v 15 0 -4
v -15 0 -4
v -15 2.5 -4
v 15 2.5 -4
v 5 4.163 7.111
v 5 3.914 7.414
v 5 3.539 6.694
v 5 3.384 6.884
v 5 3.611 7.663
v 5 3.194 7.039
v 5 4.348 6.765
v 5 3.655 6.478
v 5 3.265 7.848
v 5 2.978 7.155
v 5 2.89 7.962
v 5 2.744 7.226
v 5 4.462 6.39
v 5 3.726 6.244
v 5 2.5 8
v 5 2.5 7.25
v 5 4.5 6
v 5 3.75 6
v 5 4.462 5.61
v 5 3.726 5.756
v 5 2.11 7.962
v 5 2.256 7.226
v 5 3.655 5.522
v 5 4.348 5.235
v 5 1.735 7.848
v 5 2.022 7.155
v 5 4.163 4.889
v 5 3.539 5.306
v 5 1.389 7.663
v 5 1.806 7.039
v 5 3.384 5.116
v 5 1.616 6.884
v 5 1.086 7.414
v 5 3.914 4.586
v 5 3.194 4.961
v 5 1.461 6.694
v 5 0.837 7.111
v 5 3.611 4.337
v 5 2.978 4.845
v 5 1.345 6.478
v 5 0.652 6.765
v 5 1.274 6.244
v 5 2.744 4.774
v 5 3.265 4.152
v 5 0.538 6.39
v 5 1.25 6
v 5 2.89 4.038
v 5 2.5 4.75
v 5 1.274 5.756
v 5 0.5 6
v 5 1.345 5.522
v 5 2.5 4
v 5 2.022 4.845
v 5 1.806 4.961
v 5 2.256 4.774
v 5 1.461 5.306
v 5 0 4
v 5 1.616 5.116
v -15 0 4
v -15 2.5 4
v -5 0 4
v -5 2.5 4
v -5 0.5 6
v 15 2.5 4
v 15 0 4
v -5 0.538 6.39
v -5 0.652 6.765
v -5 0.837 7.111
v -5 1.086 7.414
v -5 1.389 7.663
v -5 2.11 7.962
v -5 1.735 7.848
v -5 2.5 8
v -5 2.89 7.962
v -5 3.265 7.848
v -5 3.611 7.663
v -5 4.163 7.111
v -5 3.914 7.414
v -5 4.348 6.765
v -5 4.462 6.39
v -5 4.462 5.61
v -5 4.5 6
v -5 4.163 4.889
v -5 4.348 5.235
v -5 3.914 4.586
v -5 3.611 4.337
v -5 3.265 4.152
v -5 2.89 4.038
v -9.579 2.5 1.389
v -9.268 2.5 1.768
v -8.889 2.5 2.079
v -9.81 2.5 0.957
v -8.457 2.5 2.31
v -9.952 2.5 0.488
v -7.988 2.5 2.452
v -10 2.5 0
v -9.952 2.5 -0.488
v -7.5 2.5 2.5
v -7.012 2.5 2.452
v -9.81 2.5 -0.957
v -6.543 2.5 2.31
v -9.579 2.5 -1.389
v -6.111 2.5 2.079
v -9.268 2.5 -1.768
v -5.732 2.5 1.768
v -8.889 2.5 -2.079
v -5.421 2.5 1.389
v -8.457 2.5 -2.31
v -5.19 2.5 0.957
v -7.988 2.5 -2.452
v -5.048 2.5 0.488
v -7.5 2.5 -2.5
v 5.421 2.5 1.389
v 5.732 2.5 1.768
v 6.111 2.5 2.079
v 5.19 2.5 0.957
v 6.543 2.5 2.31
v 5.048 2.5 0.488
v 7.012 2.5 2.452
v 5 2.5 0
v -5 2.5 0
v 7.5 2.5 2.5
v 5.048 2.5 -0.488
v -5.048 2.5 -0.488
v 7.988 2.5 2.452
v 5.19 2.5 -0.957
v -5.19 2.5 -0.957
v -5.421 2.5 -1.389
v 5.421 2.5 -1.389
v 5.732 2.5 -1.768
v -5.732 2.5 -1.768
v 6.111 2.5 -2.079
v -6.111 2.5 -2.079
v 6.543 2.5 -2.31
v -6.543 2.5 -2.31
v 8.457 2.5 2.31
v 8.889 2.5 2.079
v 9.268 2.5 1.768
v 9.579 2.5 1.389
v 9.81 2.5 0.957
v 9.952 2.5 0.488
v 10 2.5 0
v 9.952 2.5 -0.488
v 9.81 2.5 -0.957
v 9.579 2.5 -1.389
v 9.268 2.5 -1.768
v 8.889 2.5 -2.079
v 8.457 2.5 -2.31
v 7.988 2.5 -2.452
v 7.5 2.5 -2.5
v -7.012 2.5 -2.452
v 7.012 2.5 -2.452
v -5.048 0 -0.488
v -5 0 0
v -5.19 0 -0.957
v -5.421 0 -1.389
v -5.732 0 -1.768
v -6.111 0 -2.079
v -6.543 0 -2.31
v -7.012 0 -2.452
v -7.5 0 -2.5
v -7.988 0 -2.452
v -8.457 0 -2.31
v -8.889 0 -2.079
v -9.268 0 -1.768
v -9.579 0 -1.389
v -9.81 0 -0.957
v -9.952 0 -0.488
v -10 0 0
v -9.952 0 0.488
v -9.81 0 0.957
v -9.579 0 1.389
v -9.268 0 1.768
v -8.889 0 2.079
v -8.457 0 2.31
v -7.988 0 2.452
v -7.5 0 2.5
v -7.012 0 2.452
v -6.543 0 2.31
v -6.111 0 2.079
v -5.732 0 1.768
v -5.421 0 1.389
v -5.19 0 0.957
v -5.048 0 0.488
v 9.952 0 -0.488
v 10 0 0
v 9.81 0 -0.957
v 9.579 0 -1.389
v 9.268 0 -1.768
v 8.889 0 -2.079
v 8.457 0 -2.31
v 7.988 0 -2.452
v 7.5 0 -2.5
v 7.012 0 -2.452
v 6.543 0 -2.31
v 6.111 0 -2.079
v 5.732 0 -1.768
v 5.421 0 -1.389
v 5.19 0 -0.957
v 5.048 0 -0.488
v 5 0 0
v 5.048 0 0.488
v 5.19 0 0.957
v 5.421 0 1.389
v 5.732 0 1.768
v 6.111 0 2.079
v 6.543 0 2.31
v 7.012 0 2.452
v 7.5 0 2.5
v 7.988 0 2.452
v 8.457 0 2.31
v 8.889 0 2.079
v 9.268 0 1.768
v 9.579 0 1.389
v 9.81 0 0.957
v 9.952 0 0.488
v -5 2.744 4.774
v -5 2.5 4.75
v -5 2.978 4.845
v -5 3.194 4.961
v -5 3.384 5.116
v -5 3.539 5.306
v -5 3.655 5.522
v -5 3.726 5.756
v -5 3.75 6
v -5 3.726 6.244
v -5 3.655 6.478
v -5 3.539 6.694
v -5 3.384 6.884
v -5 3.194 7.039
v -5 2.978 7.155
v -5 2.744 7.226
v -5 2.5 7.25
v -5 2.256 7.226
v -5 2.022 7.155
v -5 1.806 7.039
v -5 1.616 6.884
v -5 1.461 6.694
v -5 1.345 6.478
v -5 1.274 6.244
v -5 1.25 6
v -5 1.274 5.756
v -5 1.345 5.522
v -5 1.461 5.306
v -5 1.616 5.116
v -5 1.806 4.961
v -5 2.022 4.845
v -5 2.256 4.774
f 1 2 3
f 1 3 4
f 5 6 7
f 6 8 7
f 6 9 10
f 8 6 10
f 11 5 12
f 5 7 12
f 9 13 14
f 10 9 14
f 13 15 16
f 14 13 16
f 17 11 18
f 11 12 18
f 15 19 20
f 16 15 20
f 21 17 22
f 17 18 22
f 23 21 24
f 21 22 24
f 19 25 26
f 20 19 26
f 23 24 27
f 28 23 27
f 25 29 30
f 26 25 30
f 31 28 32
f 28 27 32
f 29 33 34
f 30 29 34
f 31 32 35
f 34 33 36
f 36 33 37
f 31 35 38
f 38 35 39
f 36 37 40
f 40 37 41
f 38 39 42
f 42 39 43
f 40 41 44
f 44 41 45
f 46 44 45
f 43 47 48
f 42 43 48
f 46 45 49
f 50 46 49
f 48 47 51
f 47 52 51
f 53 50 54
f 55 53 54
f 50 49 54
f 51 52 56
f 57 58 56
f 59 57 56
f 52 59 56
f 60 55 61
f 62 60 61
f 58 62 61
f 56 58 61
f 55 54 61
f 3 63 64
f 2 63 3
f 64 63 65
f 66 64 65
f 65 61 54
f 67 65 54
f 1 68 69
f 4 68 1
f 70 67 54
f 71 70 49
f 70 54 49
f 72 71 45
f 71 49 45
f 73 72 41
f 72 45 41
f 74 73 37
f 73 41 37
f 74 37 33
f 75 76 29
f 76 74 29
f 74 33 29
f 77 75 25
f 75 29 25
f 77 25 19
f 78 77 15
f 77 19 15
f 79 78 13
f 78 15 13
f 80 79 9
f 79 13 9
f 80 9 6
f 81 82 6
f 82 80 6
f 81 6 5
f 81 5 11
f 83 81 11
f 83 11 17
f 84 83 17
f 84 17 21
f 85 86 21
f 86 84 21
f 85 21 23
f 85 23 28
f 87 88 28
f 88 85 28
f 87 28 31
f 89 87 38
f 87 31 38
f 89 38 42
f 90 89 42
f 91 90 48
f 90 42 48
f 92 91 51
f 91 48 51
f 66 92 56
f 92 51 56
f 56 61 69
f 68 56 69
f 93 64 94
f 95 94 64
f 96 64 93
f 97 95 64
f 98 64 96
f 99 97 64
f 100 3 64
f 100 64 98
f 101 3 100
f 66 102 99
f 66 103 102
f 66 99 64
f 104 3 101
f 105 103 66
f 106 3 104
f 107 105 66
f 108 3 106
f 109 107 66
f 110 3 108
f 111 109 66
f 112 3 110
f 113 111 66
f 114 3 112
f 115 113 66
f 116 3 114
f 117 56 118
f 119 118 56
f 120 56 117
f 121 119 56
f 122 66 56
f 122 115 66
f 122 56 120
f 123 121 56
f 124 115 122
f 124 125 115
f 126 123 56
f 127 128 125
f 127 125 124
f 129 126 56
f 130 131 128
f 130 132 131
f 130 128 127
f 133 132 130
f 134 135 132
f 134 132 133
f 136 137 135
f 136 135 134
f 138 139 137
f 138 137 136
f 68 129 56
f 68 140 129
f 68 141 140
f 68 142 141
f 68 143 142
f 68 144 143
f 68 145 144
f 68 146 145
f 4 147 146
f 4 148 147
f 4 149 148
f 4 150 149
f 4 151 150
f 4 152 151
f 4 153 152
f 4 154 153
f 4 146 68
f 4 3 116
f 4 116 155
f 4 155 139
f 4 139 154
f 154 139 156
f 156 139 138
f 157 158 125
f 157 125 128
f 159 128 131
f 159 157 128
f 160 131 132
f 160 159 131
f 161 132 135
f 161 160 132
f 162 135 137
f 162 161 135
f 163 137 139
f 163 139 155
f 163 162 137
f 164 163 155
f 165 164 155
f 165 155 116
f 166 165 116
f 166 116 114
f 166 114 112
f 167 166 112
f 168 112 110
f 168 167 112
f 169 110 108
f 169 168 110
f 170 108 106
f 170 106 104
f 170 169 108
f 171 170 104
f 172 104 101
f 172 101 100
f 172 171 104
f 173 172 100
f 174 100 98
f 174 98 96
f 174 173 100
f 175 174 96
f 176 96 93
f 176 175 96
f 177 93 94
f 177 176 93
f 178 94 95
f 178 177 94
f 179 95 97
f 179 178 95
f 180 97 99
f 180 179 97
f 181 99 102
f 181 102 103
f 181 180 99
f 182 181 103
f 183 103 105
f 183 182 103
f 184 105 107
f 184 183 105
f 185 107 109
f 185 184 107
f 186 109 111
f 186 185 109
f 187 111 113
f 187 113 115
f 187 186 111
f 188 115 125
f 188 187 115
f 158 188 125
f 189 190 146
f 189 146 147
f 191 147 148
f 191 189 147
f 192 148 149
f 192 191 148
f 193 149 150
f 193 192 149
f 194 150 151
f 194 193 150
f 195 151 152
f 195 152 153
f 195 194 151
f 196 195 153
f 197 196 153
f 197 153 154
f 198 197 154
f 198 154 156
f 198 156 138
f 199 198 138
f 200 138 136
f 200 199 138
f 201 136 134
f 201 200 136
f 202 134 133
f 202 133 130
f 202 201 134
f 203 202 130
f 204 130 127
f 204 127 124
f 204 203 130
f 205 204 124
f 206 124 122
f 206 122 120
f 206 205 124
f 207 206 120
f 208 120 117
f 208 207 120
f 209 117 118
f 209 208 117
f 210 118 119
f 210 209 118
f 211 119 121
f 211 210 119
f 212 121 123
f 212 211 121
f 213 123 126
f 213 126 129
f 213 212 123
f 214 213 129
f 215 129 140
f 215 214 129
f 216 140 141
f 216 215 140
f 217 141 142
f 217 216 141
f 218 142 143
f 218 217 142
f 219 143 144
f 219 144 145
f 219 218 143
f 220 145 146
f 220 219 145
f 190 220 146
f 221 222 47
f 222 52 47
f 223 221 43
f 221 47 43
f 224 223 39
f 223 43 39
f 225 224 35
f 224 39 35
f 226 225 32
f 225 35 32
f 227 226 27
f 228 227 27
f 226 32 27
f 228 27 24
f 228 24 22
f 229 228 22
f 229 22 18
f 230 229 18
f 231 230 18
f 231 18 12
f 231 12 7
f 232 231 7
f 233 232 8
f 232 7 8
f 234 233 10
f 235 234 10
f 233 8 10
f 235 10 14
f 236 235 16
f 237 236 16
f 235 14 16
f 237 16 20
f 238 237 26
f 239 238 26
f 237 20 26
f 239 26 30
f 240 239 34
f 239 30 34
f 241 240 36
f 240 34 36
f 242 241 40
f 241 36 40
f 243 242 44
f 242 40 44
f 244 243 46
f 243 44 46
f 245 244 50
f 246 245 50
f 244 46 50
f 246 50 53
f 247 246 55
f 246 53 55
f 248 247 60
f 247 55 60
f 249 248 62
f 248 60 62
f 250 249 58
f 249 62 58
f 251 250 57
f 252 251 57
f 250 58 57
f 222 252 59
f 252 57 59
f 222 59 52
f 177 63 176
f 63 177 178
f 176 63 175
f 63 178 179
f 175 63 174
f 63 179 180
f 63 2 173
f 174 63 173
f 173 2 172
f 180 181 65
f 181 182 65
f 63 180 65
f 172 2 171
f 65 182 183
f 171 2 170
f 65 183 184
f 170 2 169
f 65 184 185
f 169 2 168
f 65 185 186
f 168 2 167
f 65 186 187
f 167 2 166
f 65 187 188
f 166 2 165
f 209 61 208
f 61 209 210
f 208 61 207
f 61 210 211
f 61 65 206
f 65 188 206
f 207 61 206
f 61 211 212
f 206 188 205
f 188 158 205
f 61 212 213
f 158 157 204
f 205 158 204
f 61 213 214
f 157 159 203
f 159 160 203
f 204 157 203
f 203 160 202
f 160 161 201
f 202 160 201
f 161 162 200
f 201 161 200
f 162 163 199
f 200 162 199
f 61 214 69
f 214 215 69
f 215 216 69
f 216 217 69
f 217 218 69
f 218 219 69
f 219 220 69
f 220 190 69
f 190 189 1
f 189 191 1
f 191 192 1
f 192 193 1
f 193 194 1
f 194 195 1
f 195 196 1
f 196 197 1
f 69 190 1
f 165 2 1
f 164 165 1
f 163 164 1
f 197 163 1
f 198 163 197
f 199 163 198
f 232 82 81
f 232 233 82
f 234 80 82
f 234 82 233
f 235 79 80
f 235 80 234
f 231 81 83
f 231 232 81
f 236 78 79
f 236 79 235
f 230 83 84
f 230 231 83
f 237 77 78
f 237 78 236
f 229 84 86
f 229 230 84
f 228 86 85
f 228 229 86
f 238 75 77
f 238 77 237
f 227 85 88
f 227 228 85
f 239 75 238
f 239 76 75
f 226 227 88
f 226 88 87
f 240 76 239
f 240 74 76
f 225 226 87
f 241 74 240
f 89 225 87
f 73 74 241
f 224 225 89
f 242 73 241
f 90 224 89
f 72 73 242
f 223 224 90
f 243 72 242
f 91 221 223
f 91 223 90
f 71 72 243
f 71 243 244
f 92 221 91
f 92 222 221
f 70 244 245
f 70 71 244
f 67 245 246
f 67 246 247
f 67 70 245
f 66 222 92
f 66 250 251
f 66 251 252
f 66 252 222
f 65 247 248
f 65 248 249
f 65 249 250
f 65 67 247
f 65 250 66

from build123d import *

# Parameters (mm, degrees)
SKETCH1_W                       = 30
SKETCH1_H                       = 8
SKETCH1_R                       = 2.5
BOSS_EXTRUDE1_DEPTH             = 2.5
BOSS_EXTRUDE2_REACH             = 17
SKETCH2_R                       = 1.25
BOSS_EXTRUDE2_DIRECTION_2_REACH = 17
SKETCH4_W                       = 10
SKETCH4_H                       = 4
CUT_EXTRUDE2_DEPTH              = 5.5


with BuildPart() as part:
    # Sketch1 → Boss-Extrude1 (new body)
    with BuildSketch(Plane(origin=(0, 0, 0), x_dir=(1, 0, 0), z_dir=(0, 1, 0))):
        Rectangle(SKETCH1_W, SKETCH1_H)
        with Locations((-7.5, 0)):
            Circle(SKETCH1_R, mode=Mode.SUBTRACT)
        with Locations((7.5, 0)):
            Circle(SKETCH1_R, mode=Mode.SUBTRACT)
    extrude(amount=BOSS_EXTRUDE1_DEPTH)

    # Boss-Extrude2: up to this face of the body (flat: up to its plane)
    boss_extrude2_end = Plane(part.part.faces().sort_by_distance((15, 1.25, 0))[0])
    # Sketch2 → Boss-Extrude2 (add, up to the picked face)
    with BuildSketch(Plane(origin=(0, 0, 0), x_dir=(0, 0, -1), z_dir=(1, 0, 0)), mode=Mode.PRIVATE) as boss_extrude2_sk1:
        with BuildLine():
            Line((-4, 2.5), (-4, 0))
            Line((-4, 0), (-6, 0.5))
            ThreePointArc((-6, 0.5), (-7.414213562, 3.914213562), (-4, 2.5))
        make_face()
        with Locations((-6, 2.5)):
            Circle(SKETCH2_R, mode=Mode.SUBTRACT)
    boss_extrude2_tool1 = split(extrude(boss_extrude2_sk1.sketch, amount=BOSS_EXTRUDE2_REACH, mode=Mode.PRIVATE), bisect_by=boss_extrude2_end, keep=Keep.BOTH, mode=Mode.PRIVATE)
    add(boss_extrude2_tool1.solids().sort_by_distance((0, 1.25, 4.060208))[0])

    # Boss-Extrude2 direction 2: up to this face of the body (flat: up to its plane)
    boss_extrude2_direction_2_end = Plane(part.part.faces().sort_by_distance((-15, 1.25, 0))[0])
    # Sketch2 → Boss-Extrude2 direction 2 (add, up to the picked face)
    with BuildSketch(Plane(origin=(0, 0, 0), x_dir=(0, 0, -1), z_dir=(1, 0, 0)), mode=Mode.PRIVATE) as boss_extrude2_direction_2_sk1:
        with BuildLine():
            Line((-4, 2.5), (-4, 0))
            Line((-4, 0), (-6, 0.5))
            ThreePointArc((-6, 0.5), (-7.414213562, 3.914213562), (-4, 2.5))
        make_face()
        with Locations((-6, 2.5)):
            Circle(SKETCH2_R, mode=Mode.SUBTRACT)
    boss_extrude2_direction_2_tool1 = split(extrude(boss_extrude2_direction_2_sk1.sketch, amount=-BOSS_EXTRUDE2_DIRECTION_2_REACH, mode=Mode.PRIVATE), bisect_by=boss_extrude2_direction_2_end, keep=Keep.BOTH, mode=Mode.PRIVATE)
    add(boss_extrude2_direction_2_tool1.solids().sort_by_distance((0, 1.25, 4.060208))[0])

    # Sketch4 → Cut-Extrude2 (cut, through all)
    with BuildSketch(Plane(origin=(0, 0, 0), x_dir=(1, 0, 0), z_dir=(0, 1, 0))):
        with Locations((-10, -6)):
            Rectangle(SKETCH4_W, SKETCH4_H)
        with Locations((10, -6)):
            Rectangle(SKETCH4_W, SKETCH4_H)
    extrude(amount=CUT_EXTRUDE2_DEPTH, mode=Mode.SUBTRACT)


solid = part.part
